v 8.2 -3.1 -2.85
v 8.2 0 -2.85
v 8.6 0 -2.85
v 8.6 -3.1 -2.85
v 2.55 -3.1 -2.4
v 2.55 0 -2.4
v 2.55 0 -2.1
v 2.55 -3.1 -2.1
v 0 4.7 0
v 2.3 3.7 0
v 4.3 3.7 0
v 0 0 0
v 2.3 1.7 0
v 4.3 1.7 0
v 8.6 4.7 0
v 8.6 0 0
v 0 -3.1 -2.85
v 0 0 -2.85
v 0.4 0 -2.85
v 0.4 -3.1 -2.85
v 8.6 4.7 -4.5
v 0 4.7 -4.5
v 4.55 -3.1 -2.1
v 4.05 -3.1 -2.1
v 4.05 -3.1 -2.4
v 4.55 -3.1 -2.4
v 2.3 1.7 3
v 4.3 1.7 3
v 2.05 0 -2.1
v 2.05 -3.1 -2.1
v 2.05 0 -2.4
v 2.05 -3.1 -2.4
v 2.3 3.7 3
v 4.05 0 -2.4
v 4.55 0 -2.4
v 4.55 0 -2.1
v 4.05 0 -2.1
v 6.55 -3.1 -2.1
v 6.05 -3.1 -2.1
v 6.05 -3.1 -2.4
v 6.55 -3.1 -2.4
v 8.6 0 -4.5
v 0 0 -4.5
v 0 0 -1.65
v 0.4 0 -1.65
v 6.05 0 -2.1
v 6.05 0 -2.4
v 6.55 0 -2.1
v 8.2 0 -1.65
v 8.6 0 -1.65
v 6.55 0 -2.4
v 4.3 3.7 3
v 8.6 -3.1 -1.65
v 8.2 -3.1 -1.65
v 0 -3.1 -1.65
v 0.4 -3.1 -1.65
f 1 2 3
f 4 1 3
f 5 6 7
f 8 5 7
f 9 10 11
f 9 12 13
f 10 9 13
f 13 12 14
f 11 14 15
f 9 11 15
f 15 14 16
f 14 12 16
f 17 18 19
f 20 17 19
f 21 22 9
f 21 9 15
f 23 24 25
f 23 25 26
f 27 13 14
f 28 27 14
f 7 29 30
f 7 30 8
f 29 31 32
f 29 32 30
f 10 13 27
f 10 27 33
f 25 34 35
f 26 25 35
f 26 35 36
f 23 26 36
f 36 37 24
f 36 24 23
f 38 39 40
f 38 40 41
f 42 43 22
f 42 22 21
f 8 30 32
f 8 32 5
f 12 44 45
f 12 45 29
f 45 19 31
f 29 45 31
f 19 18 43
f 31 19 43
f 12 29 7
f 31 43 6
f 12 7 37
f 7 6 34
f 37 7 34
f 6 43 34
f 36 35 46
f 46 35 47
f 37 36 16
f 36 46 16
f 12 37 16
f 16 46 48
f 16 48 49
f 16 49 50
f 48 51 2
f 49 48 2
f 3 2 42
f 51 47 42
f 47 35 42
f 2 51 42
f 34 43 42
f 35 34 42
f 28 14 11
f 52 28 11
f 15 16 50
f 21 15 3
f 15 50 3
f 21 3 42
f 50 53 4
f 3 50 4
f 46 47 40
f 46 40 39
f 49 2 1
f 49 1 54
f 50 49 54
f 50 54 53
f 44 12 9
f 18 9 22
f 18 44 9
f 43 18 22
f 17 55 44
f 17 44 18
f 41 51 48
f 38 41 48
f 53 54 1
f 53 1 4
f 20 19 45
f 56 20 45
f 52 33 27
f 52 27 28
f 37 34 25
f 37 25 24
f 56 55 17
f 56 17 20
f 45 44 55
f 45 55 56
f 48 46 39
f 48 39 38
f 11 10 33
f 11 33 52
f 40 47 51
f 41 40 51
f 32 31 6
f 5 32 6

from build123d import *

# Parameters (mm, degrees)
SKETCH_1_W      = 8.6
SKETCH_1_H      = 4.5
EXTRUDE_1_DEPTH = 4.7
SKETCH_2_W      = 2
SKETCH_2_H      = 2
EXTRUDE_2_DEPTH = 3
SKETCH_4_W      = 0.4
SKETCH_4_H      = 1.2
EXTRUDE_3_DEPTH = 3.1
SKETCH_5_W      = 0.5
SKETCH_5_H      = 0.3
EXTRUDE_4_DEPTH = 3.1


with BuildPart() as part:
    # 草图1 → 凸台-拉伸1 (new body)
    with BuildSketch(Plane(origin=(0, 0, 0), x_dir=(1, 0, 0), z_dir=(0, 1, 0))):
        with Locations((4.3, 2.25)):
            Rectangle(SKETCH_1_W, SKETCH_1_H)
    extrude(amount=EXTRUDE_1_DEPTH)

    # 草图2 → 凸台-拉伸2 (add)
    with BuildSketch(Plane.XY):
        with Locations((3.3, 2.7)):
            Rectangle(SKETCH_2_W, SKETCH_2_H)
    extrude(amount=EXTRUDE_2_DEPTH)

    # 草图4 → 凸台-拉伸3 (add)
    with BuildSketch(Plane.XZ):
        with Locations((0.2, -2.25)):
            Rectangle(SKETCH_4_W, SKETCH_4_H)
        with Locations((8.4, -2.25)):
            Rectangle(SKETCH_4_W, SKETCH_4_H)
    extrude(amount=EXTRUDE_3_DEPTH)

    # 草图5 → 凸台-拉伸4 (add)
    with BuildSketch(Plane.XZ):
        with Locations((4.3, -2.25)):
            Rectangle(SKETCH_5_W, SKETCH_5_H)
        with Locations((6.3, -2.25)):
            Rectangle(SKETCH_5_W, SKETCH_5_H)
        with Locations((2.3, -2.25)):
            Rectangle(SKETCH_5_W, SKETCH_5_H)
    extrude(amount=EXTRUDE_4_DEPTH)


solid = part.part
